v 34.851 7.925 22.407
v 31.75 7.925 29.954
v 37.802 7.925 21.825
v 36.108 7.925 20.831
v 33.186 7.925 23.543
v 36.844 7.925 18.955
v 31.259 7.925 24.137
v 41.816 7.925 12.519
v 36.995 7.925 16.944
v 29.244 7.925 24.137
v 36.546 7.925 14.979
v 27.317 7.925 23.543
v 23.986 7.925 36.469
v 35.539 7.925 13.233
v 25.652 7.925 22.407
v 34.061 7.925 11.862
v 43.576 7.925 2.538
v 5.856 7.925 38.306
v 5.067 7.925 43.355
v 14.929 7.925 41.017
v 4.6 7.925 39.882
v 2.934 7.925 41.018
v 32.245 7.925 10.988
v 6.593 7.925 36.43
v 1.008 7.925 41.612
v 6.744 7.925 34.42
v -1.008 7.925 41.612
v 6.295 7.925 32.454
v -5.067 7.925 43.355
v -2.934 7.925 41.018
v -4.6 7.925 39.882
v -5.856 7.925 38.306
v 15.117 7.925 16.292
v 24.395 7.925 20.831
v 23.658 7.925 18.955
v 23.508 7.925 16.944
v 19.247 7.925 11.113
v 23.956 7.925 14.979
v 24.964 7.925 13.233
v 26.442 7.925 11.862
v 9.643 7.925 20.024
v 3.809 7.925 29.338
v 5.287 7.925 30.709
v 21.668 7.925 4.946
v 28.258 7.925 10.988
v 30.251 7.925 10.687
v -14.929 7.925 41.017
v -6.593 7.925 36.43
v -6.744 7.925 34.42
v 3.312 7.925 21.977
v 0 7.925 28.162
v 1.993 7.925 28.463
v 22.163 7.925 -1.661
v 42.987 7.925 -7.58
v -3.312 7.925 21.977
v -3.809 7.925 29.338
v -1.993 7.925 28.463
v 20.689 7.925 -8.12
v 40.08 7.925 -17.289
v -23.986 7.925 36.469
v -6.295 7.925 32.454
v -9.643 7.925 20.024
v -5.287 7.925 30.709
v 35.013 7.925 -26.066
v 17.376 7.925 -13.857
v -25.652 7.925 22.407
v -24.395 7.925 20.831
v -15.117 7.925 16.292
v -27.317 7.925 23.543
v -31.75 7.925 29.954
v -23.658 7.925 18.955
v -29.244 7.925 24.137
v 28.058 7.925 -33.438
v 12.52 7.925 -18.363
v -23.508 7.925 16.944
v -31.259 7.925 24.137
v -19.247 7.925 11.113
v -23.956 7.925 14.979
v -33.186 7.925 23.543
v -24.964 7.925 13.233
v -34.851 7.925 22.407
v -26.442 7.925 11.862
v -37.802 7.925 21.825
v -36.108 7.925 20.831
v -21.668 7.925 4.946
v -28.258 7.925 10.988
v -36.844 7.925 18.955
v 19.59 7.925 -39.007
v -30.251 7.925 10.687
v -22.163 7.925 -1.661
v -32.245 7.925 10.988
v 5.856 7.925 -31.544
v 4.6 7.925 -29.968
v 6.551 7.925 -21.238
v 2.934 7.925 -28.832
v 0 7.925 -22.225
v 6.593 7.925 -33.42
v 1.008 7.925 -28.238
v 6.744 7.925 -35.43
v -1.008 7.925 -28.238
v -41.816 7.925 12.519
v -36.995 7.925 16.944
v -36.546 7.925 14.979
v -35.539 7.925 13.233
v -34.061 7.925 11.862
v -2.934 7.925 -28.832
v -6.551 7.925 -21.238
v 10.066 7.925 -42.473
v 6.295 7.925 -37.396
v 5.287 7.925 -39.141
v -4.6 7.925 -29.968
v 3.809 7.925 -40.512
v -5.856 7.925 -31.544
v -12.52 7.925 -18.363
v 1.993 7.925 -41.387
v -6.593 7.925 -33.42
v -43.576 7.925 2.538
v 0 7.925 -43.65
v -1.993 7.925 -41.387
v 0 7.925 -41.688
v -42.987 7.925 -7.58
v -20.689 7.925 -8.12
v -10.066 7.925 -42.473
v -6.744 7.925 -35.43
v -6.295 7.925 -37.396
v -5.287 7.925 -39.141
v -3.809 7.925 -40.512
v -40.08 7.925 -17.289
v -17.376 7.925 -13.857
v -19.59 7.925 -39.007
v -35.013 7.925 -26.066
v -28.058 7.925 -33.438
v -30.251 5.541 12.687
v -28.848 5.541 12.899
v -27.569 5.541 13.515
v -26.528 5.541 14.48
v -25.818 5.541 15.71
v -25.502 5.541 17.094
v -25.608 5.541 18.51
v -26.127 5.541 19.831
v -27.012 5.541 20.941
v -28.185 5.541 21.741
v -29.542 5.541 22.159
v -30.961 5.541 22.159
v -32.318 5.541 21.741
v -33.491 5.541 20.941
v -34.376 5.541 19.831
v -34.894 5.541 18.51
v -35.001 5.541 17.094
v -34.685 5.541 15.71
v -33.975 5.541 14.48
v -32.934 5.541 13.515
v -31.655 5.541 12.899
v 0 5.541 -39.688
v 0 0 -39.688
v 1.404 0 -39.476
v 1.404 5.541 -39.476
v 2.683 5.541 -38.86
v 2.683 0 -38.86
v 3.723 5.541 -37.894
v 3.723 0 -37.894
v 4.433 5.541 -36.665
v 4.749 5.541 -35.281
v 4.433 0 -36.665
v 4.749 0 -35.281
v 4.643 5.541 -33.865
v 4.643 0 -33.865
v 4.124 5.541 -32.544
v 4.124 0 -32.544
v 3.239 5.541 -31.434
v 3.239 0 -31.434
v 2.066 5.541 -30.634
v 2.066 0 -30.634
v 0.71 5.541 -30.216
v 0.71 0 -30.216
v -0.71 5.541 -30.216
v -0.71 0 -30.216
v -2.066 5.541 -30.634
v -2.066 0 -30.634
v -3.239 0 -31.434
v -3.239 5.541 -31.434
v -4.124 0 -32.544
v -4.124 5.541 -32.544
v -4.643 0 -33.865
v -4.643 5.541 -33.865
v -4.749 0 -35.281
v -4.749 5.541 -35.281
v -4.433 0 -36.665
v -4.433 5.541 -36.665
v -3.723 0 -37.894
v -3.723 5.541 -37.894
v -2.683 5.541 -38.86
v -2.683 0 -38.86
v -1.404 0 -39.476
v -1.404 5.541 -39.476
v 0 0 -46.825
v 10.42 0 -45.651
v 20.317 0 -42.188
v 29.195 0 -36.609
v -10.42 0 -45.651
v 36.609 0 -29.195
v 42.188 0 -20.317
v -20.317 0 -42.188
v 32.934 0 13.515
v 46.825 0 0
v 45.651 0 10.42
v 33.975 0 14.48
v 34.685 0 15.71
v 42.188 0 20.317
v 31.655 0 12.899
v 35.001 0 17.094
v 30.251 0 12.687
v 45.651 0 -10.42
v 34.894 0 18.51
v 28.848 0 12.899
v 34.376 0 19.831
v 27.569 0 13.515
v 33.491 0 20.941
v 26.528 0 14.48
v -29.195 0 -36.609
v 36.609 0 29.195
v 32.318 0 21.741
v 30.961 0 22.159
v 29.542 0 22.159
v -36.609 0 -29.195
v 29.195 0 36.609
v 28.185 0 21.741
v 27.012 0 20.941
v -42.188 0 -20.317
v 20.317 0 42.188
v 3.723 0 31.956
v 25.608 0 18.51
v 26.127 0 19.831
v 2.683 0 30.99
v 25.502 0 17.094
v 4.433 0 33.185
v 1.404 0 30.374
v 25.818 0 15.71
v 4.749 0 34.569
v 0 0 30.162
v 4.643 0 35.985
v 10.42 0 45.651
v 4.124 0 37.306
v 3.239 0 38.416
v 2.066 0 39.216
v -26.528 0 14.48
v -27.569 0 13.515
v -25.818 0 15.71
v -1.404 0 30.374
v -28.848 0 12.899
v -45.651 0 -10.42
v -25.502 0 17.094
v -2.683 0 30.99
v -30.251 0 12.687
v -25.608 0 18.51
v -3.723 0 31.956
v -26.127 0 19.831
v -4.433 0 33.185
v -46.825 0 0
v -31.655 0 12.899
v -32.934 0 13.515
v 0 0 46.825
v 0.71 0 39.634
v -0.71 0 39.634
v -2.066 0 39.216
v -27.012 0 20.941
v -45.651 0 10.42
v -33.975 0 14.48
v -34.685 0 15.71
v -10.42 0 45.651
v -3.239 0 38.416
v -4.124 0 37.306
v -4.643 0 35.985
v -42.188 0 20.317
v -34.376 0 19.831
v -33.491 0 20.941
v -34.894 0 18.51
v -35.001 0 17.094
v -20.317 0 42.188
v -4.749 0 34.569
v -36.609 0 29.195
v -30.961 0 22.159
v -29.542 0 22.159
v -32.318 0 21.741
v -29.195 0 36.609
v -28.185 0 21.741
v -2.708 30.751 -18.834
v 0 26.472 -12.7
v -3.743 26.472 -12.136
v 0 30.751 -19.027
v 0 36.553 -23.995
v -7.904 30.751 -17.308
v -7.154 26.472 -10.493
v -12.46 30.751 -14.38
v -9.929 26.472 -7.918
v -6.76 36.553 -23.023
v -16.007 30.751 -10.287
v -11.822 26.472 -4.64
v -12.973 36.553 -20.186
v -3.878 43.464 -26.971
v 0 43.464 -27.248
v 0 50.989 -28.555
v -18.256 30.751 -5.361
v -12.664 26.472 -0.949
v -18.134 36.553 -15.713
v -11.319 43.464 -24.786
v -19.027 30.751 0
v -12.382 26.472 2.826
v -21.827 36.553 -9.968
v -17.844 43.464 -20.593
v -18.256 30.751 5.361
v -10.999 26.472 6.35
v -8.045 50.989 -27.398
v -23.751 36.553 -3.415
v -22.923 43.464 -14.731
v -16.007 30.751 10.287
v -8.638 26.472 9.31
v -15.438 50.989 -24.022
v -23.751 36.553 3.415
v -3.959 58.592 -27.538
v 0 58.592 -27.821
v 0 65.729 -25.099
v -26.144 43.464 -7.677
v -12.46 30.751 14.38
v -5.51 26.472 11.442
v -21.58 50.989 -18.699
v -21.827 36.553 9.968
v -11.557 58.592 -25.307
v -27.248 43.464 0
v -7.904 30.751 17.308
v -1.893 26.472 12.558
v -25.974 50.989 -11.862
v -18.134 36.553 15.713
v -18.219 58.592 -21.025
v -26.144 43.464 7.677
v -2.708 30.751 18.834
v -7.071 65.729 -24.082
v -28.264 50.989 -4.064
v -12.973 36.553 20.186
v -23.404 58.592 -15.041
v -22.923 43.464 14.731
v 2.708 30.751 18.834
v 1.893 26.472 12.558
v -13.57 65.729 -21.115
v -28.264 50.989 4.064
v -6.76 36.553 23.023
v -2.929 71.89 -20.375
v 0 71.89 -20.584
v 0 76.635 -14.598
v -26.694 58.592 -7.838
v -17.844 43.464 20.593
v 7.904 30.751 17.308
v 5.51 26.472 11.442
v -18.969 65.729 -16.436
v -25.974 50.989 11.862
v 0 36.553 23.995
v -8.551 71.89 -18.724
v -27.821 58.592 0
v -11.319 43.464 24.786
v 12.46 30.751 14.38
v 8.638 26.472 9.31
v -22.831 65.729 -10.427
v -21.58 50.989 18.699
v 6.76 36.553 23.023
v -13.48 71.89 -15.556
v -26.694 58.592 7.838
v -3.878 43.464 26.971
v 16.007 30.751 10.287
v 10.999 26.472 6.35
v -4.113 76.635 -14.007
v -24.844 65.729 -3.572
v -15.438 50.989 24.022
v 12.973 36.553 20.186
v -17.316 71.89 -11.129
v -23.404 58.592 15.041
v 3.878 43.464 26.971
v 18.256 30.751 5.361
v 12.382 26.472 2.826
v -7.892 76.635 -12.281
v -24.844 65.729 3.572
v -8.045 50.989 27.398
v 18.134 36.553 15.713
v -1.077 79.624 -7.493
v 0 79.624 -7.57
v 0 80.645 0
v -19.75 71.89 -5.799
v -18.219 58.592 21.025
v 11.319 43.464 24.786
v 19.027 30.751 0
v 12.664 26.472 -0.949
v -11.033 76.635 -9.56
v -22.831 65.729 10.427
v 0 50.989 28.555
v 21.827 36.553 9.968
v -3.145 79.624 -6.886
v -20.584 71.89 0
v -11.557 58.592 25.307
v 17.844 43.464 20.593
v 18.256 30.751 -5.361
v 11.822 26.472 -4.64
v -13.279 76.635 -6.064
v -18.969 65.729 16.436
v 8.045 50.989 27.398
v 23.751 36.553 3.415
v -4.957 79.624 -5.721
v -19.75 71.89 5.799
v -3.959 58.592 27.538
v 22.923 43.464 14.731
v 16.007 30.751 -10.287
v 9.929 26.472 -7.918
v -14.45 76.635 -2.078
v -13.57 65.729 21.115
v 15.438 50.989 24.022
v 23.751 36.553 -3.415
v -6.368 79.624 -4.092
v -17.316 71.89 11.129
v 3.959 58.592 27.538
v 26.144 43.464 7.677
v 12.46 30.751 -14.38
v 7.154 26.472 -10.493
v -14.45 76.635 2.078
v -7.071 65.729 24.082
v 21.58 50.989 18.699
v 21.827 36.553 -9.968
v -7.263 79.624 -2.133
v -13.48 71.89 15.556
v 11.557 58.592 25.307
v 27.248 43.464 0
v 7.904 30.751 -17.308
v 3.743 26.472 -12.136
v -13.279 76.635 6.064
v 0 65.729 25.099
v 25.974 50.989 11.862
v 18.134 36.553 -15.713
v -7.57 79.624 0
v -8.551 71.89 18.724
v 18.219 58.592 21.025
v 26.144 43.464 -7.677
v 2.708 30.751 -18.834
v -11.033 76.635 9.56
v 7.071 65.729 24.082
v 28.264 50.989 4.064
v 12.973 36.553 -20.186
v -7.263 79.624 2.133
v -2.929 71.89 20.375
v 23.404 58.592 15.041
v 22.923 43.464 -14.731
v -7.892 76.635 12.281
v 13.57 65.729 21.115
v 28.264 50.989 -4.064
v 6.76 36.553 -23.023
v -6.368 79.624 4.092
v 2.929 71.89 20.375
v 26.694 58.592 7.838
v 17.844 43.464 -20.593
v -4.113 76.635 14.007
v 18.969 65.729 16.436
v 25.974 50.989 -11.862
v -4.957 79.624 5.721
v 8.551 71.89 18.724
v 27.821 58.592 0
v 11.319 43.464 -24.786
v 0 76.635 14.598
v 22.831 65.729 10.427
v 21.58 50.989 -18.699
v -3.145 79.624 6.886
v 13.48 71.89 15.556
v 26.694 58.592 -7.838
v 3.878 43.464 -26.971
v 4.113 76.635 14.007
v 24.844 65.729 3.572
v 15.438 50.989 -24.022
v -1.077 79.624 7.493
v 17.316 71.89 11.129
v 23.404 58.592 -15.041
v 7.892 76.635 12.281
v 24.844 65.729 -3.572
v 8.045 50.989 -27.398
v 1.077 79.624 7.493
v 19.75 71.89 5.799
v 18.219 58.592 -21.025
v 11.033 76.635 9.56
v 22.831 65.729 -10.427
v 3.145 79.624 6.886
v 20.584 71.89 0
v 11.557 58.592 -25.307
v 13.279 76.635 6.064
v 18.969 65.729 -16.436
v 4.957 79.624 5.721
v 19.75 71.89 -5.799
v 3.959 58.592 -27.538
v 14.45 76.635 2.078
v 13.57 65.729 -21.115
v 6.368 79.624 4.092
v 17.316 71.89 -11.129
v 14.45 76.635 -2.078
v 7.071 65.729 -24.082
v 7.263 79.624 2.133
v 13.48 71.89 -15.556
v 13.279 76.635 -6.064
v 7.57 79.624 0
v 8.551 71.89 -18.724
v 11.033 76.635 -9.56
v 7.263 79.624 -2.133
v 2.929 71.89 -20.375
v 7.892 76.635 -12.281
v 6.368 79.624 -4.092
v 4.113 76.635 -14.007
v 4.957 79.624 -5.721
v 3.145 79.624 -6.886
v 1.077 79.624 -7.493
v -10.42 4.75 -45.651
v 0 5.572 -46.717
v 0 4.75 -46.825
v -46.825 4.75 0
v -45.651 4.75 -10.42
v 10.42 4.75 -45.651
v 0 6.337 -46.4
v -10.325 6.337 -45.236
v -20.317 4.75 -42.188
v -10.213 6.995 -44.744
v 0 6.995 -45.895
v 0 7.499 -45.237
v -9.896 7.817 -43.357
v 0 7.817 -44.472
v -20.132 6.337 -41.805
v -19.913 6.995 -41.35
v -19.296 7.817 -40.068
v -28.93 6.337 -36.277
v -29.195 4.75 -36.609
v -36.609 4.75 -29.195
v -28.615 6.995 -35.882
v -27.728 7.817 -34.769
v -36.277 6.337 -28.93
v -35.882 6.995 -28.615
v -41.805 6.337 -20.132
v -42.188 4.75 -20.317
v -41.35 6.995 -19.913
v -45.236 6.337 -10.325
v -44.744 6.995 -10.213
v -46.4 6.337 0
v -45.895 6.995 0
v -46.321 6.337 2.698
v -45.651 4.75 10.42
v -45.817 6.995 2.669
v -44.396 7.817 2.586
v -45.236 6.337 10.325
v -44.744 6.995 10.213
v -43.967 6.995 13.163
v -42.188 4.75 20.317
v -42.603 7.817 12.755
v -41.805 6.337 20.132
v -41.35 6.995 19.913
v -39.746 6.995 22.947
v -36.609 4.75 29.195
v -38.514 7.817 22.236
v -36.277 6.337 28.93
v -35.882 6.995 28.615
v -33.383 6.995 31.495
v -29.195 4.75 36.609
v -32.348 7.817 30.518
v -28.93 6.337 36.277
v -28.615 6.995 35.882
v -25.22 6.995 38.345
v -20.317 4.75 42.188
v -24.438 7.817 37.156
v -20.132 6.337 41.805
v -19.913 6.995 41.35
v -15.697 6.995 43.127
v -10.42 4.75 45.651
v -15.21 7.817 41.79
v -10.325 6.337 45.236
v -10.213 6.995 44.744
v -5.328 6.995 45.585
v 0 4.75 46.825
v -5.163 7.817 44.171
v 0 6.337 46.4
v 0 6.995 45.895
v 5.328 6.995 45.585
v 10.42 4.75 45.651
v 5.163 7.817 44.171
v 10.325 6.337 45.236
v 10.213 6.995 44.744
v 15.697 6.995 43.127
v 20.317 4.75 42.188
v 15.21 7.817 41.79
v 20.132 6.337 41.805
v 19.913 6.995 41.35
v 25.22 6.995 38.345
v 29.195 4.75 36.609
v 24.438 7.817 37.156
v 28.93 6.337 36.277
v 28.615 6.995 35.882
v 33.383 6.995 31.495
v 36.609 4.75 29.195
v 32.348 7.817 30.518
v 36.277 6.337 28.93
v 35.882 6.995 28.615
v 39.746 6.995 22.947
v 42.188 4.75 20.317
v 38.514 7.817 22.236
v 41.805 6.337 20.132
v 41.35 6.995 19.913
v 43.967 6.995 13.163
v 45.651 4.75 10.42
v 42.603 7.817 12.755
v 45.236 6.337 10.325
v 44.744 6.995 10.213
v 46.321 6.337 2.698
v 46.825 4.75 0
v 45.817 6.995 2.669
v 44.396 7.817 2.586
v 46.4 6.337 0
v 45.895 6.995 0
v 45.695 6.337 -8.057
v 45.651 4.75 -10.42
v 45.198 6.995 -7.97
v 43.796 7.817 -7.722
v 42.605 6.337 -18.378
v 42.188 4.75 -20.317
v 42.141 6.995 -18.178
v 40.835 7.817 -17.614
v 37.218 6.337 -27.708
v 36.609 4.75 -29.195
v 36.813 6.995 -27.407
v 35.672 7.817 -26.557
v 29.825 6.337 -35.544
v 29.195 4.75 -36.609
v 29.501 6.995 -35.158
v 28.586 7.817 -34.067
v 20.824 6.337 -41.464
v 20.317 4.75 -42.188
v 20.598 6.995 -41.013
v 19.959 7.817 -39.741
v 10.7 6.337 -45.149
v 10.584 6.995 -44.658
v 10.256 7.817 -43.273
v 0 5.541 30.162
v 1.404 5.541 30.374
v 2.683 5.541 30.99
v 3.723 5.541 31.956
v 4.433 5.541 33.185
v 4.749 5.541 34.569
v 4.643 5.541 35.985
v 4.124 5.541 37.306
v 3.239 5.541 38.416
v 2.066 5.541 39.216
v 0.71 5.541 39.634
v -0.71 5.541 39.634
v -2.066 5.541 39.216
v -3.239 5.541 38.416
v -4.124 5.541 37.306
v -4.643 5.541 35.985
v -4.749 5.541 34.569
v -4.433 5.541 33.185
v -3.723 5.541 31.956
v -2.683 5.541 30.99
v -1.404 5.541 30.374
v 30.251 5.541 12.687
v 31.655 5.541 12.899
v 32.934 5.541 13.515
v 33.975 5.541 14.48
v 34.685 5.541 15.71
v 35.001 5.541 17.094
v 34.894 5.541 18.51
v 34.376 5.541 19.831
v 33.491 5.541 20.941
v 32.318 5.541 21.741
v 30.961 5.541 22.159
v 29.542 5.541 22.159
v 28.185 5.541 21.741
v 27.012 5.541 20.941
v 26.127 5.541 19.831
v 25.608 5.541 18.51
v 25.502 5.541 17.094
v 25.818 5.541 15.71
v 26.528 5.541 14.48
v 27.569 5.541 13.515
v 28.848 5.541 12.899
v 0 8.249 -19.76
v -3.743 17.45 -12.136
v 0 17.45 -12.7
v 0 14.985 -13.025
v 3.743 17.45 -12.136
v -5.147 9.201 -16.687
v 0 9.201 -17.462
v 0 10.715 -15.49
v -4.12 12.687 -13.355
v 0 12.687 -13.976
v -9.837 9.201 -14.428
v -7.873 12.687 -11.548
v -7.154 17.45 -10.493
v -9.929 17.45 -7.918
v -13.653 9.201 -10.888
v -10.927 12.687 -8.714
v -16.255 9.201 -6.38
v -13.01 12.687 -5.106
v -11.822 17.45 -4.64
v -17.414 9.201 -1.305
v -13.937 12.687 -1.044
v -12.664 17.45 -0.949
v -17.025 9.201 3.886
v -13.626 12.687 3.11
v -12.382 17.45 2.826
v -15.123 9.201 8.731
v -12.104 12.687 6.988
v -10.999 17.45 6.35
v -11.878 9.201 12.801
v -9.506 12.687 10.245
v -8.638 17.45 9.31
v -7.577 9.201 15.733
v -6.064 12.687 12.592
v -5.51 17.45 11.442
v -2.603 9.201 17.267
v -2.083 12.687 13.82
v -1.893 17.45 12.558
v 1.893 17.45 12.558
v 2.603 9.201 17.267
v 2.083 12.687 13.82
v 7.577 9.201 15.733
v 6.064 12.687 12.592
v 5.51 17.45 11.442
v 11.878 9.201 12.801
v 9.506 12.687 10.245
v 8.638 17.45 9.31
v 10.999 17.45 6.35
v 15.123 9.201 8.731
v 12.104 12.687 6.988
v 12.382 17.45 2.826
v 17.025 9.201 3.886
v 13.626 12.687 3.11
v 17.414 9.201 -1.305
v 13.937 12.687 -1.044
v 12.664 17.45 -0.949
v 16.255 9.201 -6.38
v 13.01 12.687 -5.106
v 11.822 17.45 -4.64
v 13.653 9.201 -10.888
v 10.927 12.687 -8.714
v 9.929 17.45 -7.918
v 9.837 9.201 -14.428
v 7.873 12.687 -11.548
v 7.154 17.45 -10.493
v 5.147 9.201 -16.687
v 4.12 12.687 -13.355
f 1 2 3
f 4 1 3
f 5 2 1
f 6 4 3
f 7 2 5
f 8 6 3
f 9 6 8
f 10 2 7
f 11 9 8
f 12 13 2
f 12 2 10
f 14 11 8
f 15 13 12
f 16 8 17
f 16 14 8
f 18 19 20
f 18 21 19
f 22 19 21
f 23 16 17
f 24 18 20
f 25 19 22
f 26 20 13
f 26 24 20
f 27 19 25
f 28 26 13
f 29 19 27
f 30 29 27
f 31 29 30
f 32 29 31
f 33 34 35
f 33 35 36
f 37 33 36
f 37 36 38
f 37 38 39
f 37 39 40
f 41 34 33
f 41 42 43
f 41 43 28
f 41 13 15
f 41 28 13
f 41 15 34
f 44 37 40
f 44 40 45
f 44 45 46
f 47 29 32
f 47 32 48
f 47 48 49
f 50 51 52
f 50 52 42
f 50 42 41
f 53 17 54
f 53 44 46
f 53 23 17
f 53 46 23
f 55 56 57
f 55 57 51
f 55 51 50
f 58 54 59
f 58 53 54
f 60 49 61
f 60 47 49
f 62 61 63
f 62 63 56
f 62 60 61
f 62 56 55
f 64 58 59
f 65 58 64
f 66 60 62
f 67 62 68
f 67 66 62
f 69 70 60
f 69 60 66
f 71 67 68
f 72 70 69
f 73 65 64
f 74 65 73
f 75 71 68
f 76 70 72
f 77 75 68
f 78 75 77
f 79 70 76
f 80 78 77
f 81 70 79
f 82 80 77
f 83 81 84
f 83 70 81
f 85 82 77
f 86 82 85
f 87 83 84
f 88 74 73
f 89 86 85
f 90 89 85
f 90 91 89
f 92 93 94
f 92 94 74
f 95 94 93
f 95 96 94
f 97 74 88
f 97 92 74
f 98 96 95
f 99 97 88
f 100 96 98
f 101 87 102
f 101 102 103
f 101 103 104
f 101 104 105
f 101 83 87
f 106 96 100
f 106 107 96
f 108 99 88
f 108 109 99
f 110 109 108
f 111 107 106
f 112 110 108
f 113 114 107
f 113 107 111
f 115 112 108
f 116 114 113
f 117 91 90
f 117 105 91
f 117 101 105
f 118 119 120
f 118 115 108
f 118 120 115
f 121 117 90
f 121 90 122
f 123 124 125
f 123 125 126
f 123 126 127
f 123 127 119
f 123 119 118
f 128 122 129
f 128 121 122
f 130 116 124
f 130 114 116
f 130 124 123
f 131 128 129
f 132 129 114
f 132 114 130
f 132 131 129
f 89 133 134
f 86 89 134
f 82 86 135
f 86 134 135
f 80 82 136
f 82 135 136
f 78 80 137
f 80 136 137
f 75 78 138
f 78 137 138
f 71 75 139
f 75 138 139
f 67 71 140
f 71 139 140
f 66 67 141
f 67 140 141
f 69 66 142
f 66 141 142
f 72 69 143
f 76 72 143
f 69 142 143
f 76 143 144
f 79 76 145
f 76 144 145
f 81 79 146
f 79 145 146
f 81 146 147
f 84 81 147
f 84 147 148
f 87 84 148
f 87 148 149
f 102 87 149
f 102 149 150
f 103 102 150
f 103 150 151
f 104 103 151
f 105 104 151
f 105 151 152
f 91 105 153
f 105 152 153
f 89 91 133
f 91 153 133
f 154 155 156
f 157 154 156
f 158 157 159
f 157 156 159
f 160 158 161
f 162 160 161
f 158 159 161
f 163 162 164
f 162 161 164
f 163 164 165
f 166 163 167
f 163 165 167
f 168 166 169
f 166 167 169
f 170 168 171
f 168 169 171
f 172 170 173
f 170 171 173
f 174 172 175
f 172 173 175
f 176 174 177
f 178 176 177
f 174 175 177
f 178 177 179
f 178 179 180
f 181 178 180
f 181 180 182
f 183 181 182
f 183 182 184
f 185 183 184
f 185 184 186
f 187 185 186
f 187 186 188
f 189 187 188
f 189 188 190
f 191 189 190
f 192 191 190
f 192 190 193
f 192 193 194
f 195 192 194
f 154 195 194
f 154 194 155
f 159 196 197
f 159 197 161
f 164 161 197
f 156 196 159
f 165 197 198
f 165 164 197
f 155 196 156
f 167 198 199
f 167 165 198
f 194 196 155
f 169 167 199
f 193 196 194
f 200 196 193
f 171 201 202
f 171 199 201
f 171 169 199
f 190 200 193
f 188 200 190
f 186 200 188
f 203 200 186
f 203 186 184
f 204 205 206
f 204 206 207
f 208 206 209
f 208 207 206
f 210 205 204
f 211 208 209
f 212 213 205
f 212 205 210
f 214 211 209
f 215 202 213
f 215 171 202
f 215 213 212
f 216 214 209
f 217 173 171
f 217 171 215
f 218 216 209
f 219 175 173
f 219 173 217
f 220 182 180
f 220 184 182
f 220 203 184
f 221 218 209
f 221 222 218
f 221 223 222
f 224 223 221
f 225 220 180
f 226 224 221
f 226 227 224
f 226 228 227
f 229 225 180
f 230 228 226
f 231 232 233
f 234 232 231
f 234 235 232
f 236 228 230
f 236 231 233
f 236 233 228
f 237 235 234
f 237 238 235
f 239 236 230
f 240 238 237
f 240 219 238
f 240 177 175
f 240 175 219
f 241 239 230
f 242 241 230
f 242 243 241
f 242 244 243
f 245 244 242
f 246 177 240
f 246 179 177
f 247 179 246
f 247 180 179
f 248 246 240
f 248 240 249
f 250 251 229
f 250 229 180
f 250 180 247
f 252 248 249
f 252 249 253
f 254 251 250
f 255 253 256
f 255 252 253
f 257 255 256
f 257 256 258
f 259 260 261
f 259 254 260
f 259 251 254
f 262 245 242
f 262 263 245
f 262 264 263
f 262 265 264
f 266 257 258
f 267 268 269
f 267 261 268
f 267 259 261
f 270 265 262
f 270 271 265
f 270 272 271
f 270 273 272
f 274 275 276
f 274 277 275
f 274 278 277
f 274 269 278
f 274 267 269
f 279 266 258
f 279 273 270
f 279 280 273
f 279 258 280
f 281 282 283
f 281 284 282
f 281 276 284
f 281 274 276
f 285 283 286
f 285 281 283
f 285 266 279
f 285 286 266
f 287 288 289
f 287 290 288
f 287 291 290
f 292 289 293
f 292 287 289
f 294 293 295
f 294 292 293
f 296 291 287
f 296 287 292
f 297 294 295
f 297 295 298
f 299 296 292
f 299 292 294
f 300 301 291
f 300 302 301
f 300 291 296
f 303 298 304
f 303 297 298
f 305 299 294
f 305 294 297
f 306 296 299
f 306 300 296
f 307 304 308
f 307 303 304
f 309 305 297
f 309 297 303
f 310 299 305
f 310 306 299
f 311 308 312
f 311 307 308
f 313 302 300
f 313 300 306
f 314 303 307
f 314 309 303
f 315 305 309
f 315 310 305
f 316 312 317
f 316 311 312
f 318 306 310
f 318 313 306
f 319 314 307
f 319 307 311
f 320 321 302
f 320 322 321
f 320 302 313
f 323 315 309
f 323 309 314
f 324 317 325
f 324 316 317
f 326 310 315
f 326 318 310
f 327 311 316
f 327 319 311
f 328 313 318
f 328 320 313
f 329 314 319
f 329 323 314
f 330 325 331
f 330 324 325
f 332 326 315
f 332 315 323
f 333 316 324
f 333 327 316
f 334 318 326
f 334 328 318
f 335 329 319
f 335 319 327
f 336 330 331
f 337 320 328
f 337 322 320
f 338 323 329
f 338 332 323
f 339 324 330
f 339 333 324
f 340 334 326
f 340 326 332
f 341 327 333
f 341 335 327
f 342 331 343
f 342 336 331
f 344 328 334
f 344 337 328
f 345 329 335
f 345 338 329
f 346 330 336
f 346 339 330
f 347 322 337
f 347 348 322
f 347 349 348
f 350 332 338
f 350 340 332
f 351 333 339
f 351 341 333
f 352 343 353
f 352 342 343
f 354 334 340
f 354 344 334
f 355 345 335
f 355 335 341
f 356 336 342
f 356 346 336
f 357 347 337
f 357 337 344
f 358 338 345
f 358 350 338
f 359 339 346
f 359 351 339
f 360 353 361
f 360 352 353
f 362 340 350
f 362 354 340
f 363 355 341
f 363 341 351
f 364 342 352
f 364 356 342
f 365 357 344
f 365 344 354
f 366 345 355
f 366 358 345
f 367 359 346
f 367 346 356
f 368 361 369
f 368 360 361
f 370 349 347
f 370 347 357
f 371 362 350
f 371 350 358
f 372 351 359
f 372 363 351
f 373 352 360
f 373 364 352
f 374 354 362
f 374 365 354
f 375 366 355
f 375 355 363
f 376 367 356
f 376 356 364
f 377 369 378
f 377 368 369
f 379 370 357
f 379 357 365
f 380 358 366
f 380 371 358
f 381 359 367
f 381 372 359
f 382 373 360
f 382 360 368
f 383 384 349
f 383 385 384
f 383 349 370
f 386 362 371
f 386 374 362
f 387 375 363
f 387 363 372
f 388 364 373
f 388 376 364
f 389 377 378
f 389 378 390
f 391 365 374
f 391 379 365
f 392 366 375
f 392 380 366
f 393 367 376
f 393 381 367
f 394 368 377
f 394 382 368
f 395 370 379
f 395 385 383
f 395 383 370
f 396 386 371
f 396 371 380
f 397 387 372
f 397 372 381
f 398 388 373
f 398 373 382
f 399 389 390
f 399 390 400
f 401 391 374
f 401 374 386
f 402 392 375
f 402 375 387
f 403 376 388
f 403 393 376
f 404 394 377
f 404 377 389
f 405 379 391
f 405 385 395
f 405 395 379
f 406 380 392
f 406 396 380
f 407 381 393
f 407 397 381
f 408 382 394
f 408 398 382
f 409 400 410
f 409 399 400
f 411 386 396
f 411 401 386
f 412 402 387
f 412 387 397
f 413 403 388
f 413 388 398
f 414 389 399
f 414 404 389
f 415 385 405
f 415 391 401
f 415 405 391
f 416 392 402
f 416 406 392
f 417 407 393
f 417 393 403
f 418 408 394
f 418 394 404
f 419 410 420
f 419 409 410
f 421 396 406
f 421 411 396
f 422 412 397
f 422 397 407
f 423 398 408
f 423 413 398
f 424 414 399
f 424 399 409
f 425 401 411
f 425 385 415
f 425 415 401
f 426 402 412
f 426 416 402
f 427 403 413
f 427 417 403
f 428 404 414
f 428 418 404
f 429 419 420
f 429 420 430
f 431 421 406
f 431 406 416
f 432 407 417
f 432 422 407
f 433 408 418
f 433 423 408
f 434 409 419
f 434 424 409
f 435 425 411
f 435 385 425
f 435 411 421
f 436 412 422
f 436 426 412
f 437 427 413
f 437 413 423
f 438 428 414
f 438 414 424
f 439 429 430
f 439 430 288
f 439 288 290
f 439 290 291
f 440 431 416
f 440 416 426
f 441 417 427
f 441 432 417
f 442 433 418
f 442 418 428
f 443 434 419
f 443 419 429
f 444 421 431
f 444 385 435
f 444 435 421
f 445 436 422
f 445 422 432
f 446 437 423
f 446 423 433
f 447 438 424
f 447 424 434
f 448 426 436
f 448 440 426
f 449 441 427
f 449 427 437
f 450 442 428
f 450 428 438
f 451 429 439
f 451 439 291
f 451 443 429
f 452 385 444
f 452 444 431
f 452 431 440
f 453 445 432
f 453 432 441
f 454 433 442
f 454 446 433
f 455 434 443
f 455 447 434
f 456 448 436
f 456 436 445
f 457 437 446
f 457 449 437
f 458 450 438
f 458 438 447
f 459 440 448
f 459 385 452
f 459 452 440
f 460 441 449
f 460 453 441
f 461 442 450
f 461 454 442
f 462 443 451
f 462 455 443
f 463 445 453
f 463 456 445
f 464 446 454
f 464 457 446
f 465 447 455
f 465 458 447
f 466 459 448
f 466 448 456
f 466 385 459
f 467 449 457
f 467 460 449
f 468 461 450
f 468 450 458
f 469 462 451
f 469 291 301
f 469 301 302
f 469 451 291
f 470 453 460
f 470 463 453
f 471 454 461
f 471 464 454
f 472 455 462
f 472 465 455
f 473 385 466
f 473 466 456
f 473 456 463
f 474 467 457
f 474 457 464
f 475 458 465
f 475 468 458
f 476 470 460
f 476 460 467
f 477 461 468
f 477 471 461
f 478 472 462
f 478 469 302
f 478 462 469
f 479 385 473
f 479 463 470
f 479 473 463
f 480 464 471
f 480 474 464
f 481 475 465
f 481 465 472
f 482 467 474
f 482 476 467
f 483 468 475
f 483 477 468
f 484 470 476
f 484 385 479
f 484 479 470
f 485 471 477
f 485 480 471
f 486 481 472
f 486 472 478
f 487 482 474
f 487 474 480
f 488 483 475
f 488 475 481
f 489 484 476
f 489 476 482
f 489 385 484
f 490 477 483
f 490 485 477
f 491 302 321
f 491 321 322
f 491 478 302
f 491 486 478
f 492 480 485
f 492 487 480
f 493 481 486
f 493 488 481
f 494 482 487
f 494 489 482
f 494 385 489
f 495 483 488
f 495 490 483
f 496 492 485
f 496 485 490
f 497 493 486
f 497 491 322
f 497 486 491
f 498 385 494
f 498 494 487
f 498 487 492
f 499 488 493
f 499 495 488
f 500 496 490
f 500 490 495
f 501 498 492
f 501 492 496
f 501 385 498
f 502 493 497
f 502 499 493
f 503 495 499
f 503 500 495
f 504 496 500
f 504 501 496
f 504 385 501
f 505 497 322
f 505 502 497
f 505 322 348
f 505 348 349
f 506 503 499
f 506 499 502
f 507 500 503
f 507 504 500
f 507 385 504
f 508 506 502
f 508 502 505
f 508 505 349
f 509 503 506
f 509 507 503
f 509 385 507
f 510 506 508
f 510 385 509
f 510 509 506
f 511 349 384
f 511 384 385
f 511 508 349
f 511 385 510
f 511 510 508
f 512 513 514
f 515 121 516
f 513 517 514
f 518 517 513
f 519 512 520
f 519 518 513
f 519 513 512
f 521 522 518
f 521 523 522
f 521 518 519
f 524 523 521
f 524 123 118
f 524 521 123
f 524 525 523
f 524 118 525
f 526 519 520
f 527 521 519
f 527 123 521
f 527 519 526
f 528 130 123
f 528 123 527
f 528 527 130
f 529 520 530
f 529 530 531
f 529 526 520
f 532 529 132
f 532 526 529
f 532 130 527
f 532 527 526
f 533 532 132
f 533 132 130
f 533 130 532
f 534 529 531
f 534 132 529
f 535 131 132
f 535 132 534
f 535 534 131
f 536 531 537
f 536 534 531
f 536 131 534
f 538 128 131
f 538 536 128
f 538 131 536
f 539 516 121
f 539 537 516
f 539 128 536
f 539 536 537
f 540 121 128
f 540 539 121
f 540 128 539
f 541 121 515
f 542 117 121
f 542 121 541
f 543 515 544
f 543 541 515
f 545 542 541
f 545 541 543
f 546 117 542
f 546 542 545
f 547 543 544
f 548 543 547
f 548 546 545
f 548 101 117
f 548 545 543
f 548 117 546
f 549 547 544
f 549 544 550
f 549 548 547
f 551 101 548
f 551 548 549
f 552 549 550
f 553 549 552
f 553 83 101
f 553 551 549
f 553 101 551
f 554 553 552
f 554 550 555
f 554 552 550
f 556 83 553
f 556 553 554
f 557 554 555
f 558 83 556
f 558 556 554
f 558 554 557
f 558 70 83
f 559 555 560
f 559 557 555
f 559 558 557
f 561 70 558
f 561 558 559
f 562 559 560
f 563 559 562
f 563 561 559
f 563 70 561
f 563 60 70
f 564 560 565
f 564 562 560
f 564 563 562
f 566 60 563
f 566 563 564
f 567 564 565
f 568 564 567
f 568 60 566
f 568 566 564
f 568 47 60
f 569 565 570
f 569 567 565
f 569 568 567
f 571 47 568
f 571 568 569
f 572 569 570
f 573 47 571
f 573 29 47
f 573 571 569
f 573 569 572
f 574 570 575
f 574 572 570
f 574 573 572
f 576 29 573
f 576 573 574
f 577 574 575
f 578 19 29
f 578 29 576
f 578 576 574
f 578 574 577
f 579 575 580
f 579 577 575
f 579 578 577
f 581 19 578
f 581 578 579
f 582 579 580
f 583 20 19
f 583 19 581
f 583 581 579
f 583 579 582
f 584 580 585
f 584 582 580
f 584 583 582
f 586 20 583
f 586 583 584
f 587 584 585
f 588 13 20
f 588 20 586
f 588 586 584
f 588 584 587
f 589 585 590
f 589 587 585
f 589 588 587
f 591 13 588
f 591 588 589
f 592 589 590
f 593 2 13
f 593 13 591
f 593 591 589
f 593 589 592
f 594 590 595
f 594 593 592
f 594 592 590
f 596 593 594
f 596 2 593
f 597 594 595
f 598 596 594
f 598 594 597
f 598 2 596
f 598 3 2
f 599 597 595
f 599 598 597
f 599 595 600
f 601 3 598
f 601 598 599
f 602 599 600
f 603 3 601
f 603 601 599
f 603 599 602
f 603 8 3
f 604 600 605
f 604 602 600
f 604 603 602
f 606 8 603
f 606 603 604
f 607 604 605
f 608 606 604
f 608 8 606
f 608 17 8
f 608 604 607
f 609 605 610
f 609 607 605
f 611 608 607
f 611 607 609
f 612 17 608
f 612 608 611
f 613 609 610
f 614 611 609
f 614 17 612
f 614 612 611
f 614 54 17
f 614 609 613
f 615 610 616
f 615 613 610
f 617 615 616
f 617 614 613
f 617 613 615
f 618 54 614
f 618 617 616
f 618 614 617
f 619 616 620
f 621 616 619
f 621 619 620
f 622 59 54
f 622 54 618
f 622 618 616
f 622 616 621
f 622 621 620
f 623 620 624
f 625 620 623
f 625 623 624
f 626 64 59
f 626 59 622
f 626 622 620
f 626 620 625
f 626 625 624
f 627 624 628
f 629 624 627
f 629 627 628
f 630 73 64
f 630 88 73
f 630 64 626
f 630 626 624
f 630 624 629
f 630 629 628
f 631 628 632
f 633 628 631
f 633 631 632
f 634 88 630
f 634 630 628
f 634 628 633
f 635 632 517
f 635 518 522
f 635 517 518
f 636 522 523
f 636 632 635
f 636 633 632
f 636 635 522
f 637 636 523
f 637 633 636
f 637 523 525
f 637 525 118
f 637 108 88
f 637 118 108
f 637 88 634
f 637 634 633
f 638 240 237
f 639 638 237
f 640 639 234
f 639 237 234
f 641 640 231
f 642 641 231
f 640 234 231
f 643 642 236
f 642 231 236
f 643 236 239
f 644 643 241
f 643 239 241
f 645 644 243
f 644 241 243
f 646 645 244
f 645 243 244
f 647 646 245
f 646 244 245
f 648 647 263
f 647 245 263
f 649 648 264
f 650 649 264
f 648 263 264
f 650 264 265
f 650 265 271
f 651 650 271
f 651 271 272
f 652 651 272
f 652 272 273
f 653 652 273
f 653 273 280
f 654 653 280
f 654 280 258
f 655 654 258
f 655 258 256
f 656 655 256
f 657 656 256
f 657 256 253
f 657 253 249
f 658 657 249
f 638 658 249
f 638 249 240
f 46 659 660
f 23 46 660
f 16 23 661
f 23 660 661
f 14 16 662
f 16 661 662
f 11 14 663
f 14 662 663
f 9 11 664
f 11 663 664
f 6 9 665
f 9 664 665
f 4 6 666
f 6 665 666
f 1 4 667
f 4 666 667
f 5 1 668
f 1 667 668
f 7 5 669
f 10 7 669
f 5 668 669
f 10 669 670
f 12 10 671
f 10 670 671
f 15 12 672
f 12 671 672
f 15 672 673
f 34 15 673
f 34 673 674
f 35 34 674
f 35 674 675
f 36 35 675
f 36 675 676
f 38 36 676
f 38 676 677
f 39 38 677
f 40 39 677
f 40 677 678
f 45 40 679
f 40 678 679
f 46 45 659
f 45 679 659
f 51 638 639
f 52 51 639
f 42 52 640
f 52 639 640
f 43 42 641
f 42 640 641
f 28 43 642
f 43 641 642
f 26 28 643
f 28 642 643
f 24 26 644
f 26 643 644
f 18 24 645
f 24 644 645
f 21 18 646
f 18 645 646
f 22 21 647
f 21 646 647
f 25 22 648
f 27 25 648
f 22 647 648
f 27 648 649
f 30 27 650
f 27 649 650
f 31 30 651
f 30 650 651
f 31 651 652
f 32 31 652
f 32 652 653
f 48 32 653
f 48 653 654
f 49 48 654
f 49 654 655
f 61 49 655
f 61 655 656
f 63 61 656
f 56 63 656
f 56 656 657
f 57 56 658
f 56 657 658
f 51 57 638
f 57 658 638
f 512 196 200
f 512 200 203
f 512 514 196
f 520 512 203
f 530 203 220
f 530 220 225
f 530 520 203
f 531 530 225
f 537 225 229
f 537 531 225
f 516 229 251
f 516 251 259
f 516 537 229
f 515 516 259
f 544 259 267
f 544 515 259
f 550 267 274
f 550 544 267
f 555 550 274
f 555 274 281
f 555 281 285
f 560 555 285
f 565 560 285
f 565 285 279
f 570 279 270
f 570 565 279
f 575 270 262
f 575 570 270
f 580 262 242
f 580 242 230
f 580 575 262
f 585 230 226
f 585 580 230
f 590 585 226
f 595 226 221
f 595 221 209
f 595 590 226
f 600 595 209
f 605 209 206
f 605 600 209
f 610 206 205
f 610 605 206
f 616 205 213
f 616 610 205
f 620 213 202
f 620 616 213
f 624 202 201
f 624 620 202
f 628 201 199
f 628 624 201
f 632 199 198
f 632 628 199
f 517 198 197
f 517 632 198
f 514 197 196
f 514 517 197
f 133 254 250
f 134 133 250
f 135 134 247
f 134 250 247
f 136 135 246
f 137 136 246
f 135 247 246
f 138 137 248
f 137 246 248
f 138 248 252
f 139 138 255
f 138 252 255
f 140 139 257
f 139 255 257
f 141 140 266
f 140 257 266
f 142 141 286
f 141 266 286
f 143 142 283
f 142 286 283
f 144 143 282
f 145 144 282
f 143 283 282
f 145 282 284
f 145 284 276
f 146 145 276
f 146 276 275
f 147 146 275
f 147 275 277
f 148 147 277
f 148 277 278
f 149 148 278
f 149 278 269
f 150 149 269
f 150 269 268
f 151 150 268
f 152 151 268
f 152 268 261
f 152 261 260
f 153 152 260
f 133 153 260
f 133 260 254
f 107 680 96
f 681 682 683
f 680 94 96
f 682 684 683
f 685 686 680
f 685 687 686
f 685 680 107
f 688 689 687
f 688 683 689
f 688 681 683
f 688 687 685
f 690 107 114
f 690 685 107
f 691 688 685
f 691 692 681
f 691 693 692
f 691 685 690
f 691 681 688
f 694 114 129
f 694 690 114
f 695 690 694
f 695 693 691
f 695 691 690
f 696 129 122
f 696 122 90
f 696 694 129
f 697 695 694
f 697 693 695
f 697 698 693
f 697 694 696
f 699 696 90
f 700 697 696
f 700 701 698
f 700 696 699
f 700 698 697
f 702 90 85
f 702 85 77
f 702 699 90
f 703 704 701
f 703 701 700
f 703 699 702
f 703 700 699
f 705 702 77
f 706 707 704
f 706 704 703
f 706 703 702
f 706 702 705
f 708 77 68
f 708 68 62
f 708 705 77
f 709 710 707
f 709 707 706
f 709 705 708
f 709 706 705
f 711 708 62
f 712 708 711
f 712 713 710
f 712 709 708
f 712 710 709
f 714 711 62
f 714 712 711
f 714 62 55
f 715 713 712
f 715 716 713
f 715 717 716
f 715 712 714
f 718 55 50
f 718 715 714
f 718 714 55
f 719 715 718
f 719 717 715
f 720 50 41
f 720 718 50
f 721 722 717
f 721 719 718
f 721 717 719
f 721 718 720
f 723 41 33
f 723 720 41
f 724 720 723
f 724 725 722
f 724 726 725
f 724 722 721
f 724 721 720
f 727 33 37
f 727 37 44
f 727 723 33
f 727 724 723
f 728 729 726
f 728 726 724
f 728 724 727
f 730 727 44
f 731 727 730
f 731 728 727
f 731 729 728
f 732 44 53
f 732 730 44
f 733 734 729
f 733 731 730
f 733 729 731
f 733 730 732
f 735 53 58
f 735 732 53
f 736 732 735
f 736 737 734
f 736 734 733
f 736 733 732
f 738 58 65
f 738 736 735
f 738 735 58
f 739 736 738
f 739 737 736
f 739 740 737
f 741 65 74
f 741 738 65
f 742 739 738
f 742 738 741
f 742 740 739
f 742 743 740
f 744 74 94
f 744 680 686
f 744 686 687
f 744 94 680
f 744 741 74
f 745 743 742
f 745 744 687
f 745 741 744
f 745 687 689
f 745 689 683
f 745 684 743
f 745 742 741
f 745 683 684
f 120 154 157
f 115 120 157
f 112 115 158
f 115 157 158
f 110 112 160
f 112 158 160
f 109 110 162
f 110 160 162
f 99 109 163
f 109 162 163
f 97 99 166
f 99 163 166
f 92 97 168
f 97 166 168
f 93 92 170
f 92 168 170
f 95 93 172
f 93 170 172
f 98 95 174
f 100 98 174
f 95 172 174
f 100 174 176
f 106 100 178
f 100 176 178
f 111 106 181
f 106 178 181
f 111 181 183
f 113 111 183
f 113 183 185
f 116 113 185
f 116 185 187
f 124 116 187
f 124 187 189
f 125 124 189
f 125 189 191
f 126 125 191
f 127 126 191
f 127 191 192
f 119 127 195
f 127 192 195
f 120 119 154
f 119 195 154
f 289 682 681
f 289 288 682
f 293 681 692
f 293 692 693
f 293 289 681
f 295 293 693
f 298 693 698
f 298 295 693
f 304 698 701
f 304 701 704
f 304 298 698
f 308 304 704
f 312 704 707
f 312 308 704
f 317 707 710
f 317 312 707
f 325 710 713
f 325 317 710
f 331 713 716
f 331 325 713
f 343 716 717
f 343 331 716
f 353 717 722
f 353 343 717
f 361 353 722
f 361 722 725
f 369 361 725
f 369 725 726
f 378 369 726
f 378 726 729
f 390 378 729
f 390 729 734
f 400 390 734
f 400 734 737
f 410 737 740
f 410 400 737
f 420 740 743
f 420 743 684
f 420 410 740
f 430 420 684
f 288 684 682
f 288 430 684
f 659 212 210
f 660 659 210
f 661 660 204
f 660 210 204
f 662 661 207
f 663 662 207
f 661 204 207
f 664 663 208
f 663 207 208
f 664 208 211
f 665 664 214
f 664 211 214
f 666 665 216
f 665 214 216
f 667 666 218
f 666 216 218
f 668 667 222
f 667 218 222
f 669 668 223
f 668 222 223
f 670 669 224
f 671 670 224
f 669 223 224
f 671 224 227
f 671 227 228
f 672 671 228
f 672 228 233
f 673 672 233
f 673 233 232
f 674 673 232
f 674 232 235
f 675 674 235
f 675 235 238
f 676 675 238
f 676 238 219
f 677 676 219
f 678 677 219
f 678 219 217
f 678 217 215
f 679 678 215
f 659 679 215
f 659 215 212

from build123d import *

# Parameters (mm, degrees)
SKETCH3_R          = 4.7625
CUT_EXTRUDE1_DEPTH = 10
CHAMFER1_SIZE      = 2
CHAMFER1_SIZE2     = 2.383507185


with BuildPart() as part:
    # Sketch1 → Revolve1 (revolve)
    with BuildSketch(Plane(origin=(0, 0, 0), x_dir=(0, 0, -1), z_dir=(1, 0, 0))):
        with BuildLine():
            Line((0, 0), (46.8249, 0))
            Line((46.8249, 0), (46.8249, 4.7498))
            ThreePointArc((46.8249, 4.7498), (45.89496403, 6.99486403), (43.6499, 7.9248))
            Line((43.6499, 7.9248), (22.225, 7.9248))
            ThreePointArc((22.225, 7.9248), (15.489807909, 10.714607909), (12.7, 17.4498))
            Line((12.7, 17.4498), (12.7, 26.472331649))
            ThreePointArc((12.7, 26.472331649), (27.820711692, 58.592164207), (0, 80.645))
            Line((0, 80.645), (0, 0))
        make_face()
    revolve(axis=Axis((0, 0, 0), (0, 1, 0)))

    # Sketch3 → Cut-Extrude1 (cut)
    with BuildSketch(Plane.XZ):
        with Locations(Location((-30.2514, 17.4498, 0), (0, 0, 270))):
            Circle(SKETCH3_R)
        with Locations(Location((30.2514, 17.4498, 0), (0, 0, 270))):
            Circle(SKETCH3_R)
        with Locations(Location((0, -34.925, 0), (0, 0, 270))):
            Circle(SKETCH3_R)
        with Locations(Location((0, 34.925, 0), (0, 0, 270))):
            Circle(SKETCH3_R)
    extrude(amount=-CUT_EXTRUDE1_DEPTH, mode=Mode.SUBTRACT)

    # Chamfer1
    chamfer1_edges = [part.edges().sort_by_distance(p)[0] for p in [
        (-30.2514, 7.9248, 22.2123),
        (30.2514, 7.9248, 22.2123),
        (0, 7.9248, -30.1625),
        (0, 7.9248, 39.6875),
    ]]
    chamfer1_side = [part.faces().sort_by_distance(p)[0] for p in [
        (0, 7.9248, 42.415294388),
    ]]
    chamfer(chamfer1_edges, length=CHAMFER1_SIZE, length2=CHAMFER1_SIZE2, reference=chamfer1_side[0])


solid = part.part
